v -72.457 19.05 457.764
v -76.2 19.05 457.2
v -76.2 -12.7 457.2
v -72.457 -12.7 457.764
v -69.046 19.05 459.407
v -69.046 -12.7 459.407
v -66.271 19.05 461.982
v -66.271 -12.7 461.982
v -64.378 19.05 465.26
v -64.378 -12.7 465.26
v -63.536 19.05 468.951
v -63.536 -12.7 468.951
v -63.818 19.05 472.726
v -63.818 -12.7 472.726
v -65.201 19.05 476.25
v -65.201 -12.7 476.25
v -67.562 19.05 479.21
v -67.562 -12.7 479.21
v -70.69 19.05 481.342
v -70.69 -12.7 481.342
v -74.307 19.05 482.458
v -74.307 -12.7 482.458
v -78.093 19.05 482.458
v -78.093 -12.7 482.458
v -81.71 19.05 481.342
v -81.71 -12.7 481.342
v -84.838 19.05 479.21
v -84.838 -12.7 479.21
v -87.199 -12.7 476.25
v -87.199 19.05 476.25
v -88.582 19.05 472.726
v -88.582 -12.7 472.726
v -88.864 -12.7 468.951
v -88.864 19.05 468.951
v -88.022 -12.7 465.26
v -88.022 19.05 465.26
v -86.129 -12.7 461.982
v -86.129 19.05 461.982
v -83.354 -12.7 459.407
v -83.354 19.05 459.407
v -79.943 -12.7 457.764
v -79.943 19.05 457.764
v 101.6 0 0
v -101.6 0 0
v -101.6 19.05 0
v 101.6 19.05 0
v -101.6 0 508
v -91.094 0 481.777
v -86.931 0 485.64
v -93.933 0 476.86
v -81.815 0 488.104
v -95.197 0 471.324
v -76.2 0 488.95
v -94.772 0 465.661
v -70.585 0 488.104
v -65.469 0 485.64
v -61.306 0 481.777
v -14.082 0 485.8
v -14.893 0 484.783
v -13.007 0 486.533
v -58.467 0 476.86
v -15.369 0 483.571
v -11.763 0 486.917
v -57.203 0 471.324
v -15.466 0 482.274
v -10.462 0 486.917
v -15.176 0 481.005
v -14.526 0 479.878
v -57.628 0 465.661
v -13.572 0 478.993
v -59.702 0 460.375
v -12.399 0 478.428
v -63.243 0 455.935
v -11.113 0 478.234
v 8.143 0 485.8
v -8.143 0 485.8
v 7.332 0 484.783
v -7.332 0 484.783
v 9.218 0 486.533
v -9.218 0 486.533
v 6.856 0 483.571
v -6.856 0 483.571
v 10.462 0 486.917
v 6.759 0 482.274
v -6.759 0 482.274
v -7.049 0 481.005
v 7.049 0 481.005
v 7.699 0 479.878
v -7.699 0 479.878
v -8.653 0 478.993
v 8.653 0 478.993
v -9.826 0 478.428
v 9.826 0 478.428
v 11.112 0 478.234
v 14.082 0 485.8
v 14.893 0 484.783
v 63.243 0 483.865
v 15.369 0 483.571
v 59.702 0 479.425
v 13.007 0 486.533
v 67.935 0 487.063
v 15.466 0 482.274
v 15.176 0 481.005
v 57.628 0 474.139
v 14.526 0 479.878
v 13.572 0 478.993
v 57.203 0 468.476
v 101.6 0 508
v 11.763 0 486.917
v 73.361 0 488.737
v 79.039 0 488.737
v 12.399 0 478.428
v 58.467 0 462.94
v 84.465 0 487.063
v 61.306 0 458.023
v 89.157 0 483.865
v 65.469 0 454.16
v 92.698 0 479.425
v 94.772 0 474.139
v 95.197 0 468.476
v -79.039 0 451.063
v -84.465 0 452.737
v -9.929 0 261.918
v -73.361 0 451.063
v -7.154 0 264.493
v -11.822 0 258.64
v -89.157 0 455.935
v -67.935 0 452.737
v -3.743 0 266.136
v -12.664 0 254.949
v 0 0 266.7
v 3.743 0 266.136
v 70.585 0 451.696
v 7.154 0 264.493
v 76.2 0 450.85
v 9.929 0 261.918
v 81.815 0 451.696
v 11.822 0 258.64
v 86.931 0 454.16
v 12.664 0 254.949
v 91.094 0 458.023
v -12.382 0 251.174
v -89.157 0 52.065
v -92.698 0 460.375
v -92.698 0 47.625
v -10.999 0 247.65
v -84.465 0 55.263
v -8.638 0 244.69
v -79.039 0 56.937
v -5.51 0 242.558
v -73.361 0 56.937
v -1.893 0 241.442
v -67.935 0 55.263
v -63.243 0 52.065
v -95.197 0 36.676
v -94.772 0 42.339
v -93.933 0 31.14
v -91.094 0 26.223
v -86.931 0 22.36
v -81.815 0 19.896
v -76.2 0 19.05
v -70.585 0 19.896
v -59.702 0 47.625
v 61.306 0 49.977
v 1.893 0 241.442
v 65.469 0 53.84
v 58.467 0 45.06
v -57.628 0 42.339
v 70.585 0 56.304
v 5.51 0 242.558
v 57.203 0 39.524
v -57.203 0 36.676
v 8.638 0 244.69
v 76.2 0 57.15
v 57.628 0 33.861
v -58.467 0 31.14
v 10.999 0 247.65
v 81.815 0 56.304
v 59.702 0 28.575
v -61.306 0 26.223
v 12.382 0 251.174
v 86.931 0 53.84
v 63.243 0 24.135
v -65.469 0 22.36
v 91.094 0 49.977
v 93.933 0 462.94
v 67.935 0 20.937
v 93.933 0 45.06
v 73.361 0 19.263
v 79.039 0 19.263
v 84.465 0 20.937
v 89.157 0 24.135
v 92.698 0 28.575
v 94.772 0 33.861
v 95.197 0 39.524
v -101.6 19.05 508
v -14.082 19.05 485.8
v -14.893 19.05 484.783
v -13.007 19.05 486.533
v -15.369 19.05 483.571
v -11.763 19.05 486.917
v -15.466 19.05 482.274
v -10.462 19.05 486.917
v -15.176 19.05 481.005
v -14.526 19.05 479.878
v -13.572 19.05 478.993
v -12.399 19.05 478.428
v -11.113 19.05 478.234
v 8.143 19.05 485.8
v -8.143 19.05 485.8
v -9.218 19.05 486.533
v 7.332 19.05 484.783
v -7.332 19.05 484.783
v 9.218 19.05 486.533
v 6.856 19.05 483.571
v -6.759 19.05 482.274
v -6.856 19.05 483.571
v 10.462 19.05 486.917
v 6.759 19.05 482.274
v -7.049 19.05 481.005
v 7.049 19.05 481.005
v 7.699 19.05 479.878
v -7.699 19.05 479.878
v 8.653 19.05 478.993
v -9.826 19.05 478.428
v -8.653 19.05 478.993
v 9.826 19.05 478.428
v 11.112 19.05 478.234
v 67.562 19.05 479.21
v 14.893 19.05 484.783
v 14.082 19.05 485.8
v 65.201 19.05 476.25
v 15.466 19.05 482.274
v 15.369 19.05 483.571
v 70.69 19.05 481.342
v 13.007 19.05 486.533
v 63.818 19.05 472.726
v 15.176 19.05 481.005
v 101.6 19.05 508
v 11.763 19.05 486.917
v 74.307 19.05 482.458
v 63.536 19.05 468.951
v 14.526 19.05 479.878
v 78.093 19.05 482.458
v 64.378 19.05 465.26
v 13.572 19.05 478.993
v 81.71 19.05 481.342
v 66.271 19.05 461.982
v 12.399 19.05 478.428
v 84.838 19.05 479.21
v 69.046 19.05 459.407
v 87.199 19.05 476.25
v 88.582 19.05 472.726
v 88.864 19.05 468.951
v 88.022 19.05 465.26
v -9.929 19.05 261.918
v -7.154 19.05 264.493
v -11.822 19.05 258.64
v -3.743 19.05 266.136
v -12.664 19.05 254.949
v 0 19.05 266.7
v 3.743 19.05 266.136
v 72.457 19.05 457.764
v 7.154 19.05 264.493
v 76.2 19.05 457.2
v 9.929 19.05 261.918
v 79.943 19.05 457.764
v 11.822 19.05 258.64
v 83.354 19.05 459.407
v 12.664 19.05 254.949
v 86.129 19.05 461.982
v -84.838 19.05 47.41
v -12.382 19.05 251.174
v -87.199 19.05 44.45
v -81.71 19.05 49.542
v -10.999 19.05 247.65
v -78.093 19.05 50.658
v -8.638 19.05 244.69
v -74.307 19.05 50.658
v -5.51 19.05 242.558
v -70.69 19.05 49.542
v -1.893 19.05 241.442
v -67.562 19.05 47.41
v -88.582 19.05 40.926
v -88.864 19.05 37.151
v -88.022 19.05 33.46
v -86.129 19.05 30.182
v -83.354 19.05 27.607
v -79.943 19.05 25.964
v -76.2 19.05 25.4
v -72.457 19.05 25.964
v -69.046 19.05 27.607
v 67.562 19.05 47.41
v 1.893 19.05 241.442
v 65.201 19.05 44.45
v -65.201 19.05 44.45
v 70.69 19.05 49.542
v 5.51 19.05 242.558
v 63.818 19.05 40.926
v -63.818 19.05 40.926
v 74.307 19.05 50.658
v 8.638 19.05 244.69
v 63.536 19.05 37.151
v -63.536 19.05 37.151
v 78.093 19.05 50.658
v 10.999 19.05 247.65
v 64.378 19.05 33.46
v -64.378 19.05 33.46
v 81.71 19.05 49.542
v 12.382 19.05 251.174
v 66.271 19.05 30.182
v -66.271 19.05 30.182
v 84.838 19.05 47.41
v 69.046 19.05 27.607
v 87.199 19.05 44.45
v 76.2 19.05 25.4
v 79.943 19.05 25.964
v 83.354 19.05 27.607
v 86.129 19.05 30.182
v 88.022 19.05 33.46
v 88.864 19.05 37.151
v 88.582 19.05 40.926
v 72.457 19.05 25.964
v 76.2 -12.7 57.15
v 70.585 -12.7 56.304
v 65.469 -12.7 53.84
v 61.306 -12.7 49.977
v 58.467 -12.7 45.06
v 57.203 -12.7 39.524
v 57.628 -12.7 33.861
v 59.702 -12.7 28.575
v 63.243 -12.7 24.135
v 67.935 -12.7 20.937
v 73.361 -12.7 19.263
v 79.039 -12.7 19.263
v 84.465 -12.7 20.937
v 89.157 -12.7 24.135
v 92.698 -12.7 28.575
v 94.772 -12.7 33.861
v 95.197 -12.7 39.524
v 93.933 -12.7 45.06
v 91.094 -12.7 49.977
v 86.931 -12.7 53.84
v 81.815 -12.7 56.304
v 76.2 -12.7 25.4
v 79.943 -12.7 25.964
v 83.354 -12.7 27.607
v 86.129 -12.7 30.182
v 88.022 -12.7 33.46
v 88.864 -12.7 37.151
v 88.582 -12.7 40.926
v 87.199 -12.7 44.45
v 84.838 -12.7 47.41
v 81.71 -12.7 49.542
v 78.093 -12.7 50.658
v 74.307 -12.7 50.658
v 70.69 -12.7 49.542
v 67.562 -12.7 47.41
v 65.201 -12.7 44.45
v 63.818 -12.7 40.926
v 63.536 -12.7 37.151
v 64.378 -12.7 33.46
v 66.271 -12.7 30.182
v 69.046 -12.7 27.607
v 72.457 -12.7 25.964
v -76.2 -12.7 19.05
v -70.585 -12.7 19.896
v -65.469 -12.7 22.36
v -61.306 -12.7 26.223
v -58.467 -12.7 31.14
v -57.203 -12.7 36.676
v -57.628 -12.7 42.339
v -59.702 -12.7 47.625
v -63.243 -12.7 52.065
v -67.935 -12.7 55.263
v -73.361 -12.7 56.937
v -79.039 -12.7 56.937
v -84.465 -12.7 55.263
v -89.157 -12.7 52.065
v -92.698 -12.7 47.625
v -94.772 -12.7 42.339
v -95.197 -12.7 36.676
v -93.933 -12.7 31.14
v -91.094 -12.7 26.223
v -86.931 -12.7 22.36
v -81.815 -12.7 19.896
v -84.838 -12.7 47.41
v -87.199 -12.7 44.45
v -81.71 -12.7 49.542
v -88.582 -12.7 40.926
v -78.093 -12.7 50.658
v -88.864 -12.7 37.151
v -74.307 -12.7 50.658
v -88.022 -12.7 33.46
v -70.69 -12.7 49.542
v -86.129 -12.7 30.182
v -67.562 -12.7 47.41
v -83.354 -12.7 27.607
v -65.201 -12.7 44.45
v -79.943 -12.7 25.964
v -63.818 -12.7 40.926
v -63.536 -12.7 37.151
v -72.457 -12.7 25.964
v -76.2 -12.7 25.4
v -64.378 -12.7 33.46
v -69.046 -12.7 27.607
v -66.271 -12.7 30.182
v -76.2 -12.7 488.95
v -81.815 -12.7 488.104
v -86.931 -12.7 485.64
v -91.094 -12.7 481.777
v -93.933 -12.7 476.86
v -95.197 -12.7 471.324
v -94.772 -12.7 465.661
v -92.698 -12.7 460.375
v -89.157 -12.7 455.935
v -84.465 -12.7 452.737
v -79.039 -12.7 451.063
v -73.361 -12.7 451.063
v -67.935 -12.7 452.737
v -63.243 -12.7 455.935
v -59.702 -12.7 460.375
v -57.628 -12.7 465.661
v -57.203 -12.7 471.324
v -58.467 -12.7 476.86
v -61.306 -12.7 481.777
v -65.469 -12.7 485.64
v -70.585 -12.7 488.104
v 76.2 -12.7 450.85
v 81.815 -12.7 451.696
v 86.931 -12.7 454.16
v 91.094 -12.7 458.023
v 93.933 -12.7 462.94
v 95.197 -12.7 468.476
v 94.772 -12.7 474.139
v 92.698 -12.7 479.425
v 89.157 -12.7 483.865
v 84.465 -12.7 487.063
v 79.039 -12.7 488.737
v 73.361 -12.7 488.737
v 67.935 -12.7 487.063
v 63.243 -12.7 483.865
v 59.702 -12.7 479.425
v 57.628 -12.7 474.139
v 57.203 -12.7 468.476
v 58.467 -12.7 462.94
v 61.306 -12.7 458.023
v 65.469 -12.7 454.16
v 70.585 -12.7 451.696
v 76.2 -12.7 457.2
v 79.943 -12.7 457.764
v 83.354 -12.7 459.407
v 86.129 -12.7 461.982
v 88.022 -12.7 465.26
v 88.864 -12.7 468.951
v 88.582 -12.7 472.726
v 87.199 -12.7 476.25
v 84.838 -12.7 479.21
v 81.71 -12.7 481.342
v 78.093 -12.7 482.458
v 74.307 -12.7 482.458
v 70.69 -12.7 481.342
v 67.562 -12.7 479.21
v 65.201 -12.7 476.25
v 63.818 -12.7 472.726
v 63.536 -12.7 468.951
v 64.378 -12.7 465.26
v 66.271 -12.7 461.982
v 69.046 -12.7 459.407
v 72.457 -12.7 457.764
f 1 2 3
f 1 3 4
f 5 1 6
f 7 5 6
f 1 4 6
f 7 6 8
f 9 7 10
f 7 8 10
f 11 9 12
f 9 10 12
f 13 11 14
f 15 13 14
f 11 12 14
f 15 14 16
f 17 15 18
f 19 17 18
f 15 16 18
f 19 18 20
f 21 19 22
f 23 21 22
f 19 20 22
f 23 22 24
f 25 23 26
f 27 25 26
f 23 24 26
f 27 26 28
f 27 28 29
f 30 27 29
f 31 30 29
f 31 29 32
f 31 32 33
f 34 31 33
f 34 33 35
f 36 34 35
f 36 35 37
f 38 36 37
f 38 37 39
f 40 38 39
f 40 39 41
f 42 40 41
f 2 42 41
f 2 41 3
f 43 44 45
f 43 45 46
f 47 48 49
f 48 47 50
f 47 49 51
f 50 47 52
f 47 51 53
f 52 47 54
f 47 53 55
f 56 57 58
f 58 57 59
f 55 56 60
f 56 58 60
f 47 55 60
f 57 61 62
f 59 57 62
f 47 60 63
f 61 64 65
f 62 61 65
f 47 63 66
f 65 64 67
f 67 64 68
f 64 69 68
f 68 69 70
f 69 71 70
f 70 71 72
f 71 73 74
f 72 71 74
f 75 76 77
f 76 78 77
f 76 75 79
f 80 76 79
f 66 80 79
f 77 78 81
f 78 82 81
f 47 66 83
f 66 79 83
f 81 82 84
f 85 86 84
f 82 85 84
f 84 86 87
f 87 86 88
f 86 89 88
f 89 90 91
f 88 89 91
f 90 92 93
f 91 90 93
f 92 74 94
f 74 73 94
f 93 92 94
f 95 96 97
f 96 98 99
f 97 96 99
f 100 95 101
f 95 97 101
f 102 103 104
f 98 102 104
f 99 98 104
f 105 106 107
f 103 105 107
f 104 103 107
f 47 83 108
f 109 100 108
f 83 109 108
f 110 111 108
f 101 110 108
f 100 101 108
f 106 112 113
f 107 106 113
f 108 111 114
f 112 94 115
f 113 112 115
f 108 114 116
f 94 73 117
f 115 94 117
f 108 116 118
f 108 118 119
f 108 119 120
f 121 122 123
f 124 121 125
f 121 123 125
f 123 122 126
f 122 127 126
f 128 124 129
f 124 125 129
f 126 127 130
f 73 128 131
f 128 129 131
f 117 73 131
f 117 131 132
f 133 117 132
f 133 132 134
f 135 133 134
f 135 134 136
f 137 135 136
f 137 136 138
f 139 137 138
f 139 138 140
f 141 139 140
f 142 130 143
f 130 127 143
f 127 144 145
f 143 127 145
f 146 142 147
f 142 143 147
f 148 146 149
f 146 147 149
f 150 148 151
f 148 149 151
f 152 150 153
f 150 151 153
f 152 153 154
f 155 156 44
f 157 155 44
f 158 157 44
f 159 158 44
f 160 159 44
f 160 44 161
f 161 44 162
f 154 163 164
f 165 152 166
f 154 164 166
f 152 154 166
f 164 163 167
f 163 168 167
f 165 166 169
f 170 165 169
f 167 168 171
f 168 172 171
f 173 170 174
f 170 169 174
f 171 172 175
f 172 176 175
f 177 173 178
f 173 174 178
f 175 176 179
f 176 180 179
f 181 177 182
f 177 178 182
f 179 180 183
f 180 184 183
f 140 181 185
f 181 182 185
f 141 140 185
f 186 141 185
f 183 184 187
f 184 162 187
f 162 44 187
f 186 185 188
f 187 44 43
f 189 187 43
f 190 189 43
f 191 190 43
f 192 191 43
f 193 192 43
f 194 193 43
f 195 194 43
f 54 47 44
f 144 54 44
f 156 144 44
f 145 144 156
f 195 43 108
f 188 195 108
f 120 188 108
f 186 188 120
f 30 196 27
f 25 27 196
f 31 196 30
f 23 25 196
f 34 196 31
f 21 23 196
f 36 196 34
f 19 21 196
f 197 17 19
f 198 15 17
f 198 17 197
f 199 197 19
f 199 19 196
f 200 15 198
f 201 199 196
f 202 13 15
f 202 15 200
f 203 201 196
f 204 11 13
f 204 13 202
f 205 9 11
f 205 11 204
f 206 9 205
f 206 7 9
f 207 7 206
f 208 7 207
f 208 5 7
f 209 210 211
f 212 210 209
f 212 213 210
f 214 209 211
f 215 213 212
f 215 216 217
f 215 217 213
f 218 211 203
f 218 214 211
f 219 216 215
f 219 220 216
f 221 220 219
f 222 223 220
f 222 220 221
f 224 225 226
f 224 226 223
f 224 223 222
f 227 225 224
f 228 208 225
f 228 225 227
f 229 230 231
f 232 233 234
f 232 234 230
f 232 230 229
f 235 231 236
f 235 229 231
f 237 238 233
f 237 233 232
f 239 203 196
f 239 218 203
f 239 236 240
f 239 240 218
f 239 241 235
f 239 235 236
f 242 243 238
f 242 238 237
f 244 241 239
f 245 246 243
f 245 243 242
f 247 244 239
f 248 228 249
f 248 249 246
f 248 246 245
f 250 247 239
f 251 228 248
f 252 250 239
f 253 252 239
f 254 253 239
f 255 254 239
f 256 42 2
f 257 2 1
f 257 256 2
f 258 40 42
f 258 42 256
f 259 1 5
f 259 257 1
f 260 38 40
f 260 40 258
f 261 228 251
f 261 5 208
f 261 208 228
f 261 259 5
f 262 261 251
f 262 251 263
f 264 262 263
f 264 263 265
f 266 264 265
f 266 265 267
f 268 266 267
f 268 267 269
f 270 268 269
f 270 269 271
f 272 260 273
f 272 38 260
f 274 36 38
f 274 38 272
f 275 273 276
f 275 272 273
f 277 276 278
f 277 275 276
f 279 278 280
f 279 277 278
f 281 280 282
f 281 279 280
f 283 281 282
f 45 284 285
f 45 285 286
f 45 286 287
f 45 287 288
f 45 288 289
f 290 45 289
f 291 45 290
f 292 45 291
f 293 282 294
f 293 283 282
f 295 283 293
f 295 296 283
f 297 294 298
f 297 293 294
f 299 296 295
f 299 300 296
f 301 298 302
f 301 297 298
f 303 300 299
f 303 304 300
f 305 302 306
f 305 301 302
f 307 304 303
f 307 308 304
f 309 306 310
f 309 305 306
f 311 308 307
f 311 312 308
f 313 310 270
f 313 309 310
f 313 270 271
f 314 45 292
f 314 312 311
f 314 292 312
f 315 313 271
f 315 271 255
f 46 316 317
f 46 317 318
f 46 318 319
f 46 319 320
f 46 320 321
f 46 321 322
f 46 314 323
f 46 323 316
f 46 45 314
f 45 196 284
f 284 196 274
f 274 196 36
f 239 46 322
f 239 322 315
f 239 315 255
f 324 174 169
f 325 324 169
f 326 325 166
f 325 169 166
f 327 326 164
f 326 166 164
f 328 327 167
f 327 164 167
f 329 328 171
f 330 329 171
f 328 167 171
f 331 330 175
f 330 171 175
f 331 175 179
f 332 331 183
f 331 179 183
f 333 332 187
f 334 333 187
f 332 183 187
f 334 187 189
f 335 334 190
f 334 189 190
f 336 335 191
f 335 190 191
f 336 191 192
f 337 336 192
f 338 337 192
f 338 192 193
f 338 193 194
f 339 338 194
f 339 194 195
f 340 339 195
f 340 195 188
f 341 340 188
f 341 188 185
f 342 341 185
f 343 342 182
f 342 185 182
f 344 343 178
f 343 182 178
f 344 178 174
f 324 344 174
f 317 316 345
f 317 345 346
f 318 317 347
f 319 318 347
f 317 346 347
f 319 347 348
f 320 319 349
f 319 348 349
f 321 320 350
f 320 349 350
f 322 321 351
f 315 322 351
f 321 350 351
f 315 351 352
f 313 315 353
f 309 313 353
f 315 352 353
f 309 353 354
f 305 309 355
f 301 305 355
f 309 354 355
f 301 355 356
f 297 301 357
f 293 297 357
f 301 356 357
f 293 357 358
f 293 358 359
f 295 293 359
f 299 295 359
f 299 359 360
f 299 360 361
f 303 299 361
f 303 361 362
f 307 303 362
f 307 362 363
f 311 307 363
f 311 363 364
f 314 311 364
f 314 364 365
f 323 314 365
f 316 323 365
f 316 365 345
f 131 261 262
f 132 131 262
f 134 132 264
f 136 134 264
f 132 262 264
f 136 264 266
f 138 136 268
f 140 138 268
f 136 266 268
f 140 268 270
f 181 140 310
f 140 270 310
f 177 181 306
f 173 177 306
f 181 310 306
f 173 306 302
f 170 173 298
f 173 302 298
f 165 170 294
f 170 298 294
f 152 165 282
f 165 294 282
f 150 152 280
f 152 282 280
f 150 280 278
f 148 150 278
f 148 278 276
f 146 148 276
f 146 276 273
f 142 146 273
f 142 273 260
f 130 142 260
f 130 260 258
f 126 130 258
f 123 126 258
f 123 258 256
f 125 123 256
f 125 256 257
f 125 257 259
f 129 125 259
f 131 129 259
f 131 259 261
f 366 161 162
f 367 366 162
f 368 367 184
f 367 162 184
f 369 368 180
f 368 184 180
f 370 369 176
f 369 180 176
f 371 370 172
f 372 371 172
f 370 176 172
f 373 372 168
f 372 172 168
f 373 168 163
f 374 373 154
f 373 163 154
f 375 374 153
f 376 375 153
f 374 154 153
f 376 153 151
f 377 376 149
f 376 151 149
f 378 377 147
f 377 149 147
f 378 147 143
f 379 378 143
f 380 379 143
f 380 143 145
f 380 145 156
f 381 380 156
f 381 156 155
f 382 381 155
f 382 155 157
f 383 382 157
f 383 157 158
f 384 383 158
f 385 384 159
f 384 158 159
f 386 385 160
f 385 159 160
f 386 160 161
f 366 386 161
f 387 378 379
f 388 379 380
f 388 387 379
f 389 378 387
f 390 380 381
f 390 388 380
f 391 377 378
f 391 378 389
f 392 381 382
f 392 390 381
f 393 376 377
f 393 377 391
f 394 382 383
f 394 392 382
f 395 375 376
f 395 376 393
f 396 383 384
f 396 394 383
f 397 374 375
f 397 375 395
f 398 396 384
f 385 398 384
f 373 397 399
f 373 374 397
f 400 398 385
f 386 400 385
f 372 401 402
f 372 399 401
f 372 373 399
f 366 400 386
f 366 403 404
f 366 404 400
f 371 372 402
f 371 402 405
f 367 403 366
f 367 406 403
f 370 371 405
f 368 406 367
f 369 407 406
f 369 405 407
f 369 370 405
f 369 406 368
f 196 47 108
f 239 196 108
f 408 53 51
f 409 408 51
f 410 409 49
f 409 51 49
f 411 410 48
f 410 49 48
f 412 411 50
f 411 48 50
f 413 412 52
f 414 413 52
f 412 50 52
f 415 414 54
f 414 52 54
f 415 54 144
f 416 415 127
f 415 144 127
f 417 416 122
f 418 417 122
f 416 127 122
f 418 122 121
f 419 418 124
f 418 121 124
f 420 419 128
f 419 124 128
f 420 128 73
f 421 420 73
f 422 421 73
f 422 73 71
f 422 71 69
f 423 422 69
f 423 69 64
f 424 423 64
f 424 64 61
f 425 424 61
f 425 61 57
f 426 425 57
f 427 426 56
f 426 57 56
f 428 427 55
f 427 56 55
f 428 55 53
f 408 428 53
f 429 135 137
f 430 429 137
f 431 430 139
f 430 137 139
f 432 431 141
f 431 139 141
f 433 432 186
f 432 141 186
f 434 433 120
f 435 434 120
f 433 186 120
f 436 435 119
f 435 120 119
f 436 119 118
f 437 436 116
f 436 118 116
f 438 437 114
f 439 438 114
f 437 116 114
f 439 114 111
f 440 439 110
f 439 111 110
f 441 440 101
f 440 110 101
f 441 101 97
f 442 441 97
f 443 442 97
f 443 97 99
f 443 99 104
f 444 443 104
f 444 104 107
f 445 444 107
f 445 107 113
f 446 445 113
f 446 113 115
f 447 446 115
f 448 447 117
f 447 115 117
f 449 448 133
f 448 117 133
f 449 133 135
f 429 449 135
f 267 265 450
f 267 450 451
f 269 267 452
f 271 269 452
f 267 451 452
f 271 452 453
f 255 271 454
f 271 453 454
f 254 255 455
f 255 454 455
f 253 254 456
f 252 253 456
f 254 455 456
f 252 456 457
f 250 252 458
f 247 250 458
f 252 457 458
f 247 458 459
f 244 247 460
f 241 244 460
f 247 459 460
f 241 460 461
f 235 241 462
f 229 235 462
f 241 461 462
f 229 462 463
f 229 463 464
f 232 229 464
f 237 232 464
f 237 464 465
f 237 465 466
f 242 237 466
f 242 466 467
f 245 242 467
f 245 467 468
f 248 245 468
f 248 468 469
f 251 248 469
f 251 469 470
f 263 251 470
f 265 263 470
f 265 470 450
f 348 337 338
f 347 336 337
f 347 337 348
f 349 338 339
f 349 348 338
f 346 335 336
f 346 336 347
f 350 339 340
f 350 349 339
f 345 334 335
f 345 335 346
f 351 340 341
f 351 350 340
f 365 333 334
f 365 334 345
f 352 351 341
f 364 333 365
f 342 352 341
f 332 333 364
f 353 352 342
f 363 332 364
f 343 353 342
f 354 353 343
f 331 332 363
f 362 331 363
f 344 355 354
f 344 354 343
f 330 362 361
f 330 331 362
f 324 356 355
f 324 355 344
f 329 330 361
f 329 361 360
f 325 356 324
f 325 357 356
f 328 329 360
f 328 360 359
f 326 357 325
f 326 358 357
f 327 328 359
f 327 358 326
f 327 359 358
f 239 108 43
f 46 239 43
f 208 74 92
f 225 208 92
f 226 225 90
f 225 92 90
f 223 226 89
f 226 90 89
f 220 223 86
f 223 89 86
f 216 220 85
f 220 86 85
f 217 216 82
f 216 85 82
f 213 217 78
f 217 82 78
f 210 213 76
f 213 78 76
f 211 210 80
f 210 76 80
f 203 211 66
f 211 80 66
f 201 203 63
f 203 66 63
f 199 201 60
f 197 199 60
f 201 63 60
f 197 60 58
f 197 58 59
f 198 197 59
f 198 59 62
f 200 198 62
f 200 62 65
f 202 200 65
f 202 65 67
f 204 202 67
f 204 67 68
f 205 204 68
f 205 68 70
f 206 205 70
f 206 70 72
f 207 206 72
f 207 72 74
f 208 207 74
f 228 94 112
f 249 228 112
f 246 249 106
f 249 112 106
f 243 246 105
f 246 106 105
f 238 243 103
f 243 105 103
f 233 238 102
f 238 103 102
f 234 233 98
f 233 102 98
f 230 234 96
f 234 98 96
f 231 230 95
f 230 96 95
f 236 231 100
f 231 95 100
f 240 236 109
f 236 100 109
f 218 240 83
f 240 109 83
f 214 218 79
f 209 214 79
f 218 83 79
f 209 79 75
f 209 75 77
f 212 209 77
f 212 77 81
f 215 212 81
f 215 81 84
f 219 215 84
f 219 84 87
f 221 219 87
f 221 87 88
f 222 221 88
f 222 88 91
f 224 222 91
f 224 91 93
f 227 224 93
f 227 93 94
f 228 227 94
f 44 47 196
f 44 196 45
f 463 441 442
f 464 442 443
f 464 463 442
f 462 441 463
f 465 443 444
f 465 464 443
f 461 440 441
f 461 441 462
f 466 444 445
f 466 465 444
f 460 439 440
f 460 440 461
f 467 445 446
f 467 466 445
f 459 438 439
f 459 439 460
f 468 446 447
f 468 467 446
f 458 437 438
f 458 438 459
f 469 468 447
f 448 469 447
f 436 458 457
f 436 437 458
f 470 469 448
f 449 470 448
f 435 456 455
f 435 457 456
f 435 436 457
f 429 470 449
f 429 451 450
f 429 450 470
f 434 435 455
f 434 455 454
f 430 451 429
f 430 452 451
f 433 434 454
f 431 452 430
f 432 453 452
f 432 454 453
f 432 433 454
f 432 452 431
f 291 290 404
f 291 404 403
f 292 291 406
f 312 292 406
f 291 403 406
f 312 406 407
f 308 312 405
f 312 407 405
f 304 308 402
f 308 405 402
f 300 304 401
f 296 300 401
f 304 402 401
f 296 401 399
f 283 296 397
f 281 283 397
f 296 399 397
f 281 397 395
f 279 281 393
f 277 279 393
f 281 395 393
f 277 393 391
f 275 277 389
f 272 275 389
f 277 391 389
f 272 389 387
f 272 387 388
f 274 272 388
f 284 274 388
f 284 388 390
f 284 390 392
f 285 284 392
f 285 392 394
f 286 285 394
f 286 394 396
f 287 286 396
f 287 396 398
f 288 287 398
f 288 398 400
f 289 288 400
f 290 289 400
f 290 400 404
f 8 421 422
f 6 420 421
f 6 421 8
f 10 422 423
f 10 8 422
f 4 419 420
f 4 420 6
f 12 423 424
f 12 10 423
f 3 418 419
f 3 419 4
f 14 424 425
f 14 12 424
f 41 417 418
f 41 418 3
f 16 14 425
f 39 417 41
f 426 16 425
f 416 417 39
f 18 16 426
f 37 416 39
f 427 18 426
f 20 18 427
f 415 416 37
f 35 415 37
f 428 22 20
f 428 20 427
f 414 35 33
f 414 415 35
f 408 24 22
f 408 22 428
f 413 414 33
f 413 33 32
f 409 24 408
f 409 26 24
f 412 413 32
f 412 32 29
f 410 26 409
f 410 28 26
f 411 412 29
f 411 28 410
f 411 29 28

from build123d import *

# Parameters (mm, degrees)
SKETCH1_W           = 203.2
SKETCH1_H           = 508
BASE_EXTRUDE_DEPTH  = 19.05
SKETCH2_R           = 19.05
BOSS_EXTRUDE1_DEPTH = 12.7
SKETCH3_R           = 12.7
CUT_EXTRUDE1_DEPTH  = 520.032390608
SKETCH4_R           = 12.7
CUT_EXTRUDE2_DEPTH  = 520.032390608
SKETCH5_R           = 4.365625
CUT_EXTRUDE3_DEPTH  = 519.410515422


with BuildPart() as part:
    # Sketch1 → Base-Extrude (new body)
    with BuildSketch(Plane(origin=(0, 0, 0), x_dir=(1, 0, 0), z_dir=(0, 1, 0))):
        with Locations((0, -254)):
            Rectangle(SKETCH1_W, SKETCH1_H)
    extrude(amount=BASE_EXTRUDE_DEPTH)

    # Sketch2 → Boss-Extrude1 (add)
    with BuildSketch(Plane.XZ):
        with Locations(Location((76.2, 469.9, 0), (0, 0, 270))):
            Circle(SKETCH2_R)
        with Locations(Location((76.2, 38.1, 0), (0, 0, 90))):
            Circle(SKETCH2_R)
        with Locations(Location((-76.2, 38.1, 0), (0, 0, 270))):
            Circle(SKETCH2_R)
        with Locations(Location((-76.2, 469.9, 0), (0, 0, 90))):
            Circle(SKETCH2_R)
    extrude(amount=BOSS_EXTRUDE1_DEPTH)

    # Sketch3 → Cut-Extrude1 (cut, through all)
    with BuildSketch(Plane.XZ.offset(12.7)):
        with Locations(Location((76.2, 469.9, 0), (0, 0, 270))):
            Circle(SKETCH3_R)
        with Locations(Location((-76.2, 469.9, 0), (0, 0, 270))):
            Circle(SKETCH3_R)
        with Locations(Location((76.2, 38.1, 0), (0, 0, 270))):
            Circle(SKETCH3_R)
        with Locations(Location((-76.2, 38.1, 0), (0, 0, 270))):
            Circle(SKETCH3_R)
    extrude(amount=-CUT_EXTRUDE1_DEPTH, mode=Mode.SUBTRACT)

    # Sketch4 → Cut-Extrude2 (cut, through all)
    with BuildSketch(Plane(origin=(0, 19.05, 0), x_dir=(-1, 0, 0), z_dir=(0, 1, 0))):
        with Locations(Location((0, 254, 0), (0, 0, 90))):
            Circle(SKETCH4_R)
    extrude(amount=-CUT_EXTRUDE2_DEPTH, mode=Mode.SUBTRACT)

    # Sketch5 → Cut-Extrude3 (cut, through all)
    with BuildSketch(Plane.XZ):
        with Locations(Location((11.1125, 482.6, 0), (0, 0, 270))):
            Circle(SKETCH5_R)
        with Locations(Location((-11.1125, 482.6, 0), (0, 0, 270))):
            Circle(SKETCH5_R)
    extrude(amount=-CUT_EXTRUDE3_DEPTH, mode=Mode.SUBTRACT)


solid = part.part
